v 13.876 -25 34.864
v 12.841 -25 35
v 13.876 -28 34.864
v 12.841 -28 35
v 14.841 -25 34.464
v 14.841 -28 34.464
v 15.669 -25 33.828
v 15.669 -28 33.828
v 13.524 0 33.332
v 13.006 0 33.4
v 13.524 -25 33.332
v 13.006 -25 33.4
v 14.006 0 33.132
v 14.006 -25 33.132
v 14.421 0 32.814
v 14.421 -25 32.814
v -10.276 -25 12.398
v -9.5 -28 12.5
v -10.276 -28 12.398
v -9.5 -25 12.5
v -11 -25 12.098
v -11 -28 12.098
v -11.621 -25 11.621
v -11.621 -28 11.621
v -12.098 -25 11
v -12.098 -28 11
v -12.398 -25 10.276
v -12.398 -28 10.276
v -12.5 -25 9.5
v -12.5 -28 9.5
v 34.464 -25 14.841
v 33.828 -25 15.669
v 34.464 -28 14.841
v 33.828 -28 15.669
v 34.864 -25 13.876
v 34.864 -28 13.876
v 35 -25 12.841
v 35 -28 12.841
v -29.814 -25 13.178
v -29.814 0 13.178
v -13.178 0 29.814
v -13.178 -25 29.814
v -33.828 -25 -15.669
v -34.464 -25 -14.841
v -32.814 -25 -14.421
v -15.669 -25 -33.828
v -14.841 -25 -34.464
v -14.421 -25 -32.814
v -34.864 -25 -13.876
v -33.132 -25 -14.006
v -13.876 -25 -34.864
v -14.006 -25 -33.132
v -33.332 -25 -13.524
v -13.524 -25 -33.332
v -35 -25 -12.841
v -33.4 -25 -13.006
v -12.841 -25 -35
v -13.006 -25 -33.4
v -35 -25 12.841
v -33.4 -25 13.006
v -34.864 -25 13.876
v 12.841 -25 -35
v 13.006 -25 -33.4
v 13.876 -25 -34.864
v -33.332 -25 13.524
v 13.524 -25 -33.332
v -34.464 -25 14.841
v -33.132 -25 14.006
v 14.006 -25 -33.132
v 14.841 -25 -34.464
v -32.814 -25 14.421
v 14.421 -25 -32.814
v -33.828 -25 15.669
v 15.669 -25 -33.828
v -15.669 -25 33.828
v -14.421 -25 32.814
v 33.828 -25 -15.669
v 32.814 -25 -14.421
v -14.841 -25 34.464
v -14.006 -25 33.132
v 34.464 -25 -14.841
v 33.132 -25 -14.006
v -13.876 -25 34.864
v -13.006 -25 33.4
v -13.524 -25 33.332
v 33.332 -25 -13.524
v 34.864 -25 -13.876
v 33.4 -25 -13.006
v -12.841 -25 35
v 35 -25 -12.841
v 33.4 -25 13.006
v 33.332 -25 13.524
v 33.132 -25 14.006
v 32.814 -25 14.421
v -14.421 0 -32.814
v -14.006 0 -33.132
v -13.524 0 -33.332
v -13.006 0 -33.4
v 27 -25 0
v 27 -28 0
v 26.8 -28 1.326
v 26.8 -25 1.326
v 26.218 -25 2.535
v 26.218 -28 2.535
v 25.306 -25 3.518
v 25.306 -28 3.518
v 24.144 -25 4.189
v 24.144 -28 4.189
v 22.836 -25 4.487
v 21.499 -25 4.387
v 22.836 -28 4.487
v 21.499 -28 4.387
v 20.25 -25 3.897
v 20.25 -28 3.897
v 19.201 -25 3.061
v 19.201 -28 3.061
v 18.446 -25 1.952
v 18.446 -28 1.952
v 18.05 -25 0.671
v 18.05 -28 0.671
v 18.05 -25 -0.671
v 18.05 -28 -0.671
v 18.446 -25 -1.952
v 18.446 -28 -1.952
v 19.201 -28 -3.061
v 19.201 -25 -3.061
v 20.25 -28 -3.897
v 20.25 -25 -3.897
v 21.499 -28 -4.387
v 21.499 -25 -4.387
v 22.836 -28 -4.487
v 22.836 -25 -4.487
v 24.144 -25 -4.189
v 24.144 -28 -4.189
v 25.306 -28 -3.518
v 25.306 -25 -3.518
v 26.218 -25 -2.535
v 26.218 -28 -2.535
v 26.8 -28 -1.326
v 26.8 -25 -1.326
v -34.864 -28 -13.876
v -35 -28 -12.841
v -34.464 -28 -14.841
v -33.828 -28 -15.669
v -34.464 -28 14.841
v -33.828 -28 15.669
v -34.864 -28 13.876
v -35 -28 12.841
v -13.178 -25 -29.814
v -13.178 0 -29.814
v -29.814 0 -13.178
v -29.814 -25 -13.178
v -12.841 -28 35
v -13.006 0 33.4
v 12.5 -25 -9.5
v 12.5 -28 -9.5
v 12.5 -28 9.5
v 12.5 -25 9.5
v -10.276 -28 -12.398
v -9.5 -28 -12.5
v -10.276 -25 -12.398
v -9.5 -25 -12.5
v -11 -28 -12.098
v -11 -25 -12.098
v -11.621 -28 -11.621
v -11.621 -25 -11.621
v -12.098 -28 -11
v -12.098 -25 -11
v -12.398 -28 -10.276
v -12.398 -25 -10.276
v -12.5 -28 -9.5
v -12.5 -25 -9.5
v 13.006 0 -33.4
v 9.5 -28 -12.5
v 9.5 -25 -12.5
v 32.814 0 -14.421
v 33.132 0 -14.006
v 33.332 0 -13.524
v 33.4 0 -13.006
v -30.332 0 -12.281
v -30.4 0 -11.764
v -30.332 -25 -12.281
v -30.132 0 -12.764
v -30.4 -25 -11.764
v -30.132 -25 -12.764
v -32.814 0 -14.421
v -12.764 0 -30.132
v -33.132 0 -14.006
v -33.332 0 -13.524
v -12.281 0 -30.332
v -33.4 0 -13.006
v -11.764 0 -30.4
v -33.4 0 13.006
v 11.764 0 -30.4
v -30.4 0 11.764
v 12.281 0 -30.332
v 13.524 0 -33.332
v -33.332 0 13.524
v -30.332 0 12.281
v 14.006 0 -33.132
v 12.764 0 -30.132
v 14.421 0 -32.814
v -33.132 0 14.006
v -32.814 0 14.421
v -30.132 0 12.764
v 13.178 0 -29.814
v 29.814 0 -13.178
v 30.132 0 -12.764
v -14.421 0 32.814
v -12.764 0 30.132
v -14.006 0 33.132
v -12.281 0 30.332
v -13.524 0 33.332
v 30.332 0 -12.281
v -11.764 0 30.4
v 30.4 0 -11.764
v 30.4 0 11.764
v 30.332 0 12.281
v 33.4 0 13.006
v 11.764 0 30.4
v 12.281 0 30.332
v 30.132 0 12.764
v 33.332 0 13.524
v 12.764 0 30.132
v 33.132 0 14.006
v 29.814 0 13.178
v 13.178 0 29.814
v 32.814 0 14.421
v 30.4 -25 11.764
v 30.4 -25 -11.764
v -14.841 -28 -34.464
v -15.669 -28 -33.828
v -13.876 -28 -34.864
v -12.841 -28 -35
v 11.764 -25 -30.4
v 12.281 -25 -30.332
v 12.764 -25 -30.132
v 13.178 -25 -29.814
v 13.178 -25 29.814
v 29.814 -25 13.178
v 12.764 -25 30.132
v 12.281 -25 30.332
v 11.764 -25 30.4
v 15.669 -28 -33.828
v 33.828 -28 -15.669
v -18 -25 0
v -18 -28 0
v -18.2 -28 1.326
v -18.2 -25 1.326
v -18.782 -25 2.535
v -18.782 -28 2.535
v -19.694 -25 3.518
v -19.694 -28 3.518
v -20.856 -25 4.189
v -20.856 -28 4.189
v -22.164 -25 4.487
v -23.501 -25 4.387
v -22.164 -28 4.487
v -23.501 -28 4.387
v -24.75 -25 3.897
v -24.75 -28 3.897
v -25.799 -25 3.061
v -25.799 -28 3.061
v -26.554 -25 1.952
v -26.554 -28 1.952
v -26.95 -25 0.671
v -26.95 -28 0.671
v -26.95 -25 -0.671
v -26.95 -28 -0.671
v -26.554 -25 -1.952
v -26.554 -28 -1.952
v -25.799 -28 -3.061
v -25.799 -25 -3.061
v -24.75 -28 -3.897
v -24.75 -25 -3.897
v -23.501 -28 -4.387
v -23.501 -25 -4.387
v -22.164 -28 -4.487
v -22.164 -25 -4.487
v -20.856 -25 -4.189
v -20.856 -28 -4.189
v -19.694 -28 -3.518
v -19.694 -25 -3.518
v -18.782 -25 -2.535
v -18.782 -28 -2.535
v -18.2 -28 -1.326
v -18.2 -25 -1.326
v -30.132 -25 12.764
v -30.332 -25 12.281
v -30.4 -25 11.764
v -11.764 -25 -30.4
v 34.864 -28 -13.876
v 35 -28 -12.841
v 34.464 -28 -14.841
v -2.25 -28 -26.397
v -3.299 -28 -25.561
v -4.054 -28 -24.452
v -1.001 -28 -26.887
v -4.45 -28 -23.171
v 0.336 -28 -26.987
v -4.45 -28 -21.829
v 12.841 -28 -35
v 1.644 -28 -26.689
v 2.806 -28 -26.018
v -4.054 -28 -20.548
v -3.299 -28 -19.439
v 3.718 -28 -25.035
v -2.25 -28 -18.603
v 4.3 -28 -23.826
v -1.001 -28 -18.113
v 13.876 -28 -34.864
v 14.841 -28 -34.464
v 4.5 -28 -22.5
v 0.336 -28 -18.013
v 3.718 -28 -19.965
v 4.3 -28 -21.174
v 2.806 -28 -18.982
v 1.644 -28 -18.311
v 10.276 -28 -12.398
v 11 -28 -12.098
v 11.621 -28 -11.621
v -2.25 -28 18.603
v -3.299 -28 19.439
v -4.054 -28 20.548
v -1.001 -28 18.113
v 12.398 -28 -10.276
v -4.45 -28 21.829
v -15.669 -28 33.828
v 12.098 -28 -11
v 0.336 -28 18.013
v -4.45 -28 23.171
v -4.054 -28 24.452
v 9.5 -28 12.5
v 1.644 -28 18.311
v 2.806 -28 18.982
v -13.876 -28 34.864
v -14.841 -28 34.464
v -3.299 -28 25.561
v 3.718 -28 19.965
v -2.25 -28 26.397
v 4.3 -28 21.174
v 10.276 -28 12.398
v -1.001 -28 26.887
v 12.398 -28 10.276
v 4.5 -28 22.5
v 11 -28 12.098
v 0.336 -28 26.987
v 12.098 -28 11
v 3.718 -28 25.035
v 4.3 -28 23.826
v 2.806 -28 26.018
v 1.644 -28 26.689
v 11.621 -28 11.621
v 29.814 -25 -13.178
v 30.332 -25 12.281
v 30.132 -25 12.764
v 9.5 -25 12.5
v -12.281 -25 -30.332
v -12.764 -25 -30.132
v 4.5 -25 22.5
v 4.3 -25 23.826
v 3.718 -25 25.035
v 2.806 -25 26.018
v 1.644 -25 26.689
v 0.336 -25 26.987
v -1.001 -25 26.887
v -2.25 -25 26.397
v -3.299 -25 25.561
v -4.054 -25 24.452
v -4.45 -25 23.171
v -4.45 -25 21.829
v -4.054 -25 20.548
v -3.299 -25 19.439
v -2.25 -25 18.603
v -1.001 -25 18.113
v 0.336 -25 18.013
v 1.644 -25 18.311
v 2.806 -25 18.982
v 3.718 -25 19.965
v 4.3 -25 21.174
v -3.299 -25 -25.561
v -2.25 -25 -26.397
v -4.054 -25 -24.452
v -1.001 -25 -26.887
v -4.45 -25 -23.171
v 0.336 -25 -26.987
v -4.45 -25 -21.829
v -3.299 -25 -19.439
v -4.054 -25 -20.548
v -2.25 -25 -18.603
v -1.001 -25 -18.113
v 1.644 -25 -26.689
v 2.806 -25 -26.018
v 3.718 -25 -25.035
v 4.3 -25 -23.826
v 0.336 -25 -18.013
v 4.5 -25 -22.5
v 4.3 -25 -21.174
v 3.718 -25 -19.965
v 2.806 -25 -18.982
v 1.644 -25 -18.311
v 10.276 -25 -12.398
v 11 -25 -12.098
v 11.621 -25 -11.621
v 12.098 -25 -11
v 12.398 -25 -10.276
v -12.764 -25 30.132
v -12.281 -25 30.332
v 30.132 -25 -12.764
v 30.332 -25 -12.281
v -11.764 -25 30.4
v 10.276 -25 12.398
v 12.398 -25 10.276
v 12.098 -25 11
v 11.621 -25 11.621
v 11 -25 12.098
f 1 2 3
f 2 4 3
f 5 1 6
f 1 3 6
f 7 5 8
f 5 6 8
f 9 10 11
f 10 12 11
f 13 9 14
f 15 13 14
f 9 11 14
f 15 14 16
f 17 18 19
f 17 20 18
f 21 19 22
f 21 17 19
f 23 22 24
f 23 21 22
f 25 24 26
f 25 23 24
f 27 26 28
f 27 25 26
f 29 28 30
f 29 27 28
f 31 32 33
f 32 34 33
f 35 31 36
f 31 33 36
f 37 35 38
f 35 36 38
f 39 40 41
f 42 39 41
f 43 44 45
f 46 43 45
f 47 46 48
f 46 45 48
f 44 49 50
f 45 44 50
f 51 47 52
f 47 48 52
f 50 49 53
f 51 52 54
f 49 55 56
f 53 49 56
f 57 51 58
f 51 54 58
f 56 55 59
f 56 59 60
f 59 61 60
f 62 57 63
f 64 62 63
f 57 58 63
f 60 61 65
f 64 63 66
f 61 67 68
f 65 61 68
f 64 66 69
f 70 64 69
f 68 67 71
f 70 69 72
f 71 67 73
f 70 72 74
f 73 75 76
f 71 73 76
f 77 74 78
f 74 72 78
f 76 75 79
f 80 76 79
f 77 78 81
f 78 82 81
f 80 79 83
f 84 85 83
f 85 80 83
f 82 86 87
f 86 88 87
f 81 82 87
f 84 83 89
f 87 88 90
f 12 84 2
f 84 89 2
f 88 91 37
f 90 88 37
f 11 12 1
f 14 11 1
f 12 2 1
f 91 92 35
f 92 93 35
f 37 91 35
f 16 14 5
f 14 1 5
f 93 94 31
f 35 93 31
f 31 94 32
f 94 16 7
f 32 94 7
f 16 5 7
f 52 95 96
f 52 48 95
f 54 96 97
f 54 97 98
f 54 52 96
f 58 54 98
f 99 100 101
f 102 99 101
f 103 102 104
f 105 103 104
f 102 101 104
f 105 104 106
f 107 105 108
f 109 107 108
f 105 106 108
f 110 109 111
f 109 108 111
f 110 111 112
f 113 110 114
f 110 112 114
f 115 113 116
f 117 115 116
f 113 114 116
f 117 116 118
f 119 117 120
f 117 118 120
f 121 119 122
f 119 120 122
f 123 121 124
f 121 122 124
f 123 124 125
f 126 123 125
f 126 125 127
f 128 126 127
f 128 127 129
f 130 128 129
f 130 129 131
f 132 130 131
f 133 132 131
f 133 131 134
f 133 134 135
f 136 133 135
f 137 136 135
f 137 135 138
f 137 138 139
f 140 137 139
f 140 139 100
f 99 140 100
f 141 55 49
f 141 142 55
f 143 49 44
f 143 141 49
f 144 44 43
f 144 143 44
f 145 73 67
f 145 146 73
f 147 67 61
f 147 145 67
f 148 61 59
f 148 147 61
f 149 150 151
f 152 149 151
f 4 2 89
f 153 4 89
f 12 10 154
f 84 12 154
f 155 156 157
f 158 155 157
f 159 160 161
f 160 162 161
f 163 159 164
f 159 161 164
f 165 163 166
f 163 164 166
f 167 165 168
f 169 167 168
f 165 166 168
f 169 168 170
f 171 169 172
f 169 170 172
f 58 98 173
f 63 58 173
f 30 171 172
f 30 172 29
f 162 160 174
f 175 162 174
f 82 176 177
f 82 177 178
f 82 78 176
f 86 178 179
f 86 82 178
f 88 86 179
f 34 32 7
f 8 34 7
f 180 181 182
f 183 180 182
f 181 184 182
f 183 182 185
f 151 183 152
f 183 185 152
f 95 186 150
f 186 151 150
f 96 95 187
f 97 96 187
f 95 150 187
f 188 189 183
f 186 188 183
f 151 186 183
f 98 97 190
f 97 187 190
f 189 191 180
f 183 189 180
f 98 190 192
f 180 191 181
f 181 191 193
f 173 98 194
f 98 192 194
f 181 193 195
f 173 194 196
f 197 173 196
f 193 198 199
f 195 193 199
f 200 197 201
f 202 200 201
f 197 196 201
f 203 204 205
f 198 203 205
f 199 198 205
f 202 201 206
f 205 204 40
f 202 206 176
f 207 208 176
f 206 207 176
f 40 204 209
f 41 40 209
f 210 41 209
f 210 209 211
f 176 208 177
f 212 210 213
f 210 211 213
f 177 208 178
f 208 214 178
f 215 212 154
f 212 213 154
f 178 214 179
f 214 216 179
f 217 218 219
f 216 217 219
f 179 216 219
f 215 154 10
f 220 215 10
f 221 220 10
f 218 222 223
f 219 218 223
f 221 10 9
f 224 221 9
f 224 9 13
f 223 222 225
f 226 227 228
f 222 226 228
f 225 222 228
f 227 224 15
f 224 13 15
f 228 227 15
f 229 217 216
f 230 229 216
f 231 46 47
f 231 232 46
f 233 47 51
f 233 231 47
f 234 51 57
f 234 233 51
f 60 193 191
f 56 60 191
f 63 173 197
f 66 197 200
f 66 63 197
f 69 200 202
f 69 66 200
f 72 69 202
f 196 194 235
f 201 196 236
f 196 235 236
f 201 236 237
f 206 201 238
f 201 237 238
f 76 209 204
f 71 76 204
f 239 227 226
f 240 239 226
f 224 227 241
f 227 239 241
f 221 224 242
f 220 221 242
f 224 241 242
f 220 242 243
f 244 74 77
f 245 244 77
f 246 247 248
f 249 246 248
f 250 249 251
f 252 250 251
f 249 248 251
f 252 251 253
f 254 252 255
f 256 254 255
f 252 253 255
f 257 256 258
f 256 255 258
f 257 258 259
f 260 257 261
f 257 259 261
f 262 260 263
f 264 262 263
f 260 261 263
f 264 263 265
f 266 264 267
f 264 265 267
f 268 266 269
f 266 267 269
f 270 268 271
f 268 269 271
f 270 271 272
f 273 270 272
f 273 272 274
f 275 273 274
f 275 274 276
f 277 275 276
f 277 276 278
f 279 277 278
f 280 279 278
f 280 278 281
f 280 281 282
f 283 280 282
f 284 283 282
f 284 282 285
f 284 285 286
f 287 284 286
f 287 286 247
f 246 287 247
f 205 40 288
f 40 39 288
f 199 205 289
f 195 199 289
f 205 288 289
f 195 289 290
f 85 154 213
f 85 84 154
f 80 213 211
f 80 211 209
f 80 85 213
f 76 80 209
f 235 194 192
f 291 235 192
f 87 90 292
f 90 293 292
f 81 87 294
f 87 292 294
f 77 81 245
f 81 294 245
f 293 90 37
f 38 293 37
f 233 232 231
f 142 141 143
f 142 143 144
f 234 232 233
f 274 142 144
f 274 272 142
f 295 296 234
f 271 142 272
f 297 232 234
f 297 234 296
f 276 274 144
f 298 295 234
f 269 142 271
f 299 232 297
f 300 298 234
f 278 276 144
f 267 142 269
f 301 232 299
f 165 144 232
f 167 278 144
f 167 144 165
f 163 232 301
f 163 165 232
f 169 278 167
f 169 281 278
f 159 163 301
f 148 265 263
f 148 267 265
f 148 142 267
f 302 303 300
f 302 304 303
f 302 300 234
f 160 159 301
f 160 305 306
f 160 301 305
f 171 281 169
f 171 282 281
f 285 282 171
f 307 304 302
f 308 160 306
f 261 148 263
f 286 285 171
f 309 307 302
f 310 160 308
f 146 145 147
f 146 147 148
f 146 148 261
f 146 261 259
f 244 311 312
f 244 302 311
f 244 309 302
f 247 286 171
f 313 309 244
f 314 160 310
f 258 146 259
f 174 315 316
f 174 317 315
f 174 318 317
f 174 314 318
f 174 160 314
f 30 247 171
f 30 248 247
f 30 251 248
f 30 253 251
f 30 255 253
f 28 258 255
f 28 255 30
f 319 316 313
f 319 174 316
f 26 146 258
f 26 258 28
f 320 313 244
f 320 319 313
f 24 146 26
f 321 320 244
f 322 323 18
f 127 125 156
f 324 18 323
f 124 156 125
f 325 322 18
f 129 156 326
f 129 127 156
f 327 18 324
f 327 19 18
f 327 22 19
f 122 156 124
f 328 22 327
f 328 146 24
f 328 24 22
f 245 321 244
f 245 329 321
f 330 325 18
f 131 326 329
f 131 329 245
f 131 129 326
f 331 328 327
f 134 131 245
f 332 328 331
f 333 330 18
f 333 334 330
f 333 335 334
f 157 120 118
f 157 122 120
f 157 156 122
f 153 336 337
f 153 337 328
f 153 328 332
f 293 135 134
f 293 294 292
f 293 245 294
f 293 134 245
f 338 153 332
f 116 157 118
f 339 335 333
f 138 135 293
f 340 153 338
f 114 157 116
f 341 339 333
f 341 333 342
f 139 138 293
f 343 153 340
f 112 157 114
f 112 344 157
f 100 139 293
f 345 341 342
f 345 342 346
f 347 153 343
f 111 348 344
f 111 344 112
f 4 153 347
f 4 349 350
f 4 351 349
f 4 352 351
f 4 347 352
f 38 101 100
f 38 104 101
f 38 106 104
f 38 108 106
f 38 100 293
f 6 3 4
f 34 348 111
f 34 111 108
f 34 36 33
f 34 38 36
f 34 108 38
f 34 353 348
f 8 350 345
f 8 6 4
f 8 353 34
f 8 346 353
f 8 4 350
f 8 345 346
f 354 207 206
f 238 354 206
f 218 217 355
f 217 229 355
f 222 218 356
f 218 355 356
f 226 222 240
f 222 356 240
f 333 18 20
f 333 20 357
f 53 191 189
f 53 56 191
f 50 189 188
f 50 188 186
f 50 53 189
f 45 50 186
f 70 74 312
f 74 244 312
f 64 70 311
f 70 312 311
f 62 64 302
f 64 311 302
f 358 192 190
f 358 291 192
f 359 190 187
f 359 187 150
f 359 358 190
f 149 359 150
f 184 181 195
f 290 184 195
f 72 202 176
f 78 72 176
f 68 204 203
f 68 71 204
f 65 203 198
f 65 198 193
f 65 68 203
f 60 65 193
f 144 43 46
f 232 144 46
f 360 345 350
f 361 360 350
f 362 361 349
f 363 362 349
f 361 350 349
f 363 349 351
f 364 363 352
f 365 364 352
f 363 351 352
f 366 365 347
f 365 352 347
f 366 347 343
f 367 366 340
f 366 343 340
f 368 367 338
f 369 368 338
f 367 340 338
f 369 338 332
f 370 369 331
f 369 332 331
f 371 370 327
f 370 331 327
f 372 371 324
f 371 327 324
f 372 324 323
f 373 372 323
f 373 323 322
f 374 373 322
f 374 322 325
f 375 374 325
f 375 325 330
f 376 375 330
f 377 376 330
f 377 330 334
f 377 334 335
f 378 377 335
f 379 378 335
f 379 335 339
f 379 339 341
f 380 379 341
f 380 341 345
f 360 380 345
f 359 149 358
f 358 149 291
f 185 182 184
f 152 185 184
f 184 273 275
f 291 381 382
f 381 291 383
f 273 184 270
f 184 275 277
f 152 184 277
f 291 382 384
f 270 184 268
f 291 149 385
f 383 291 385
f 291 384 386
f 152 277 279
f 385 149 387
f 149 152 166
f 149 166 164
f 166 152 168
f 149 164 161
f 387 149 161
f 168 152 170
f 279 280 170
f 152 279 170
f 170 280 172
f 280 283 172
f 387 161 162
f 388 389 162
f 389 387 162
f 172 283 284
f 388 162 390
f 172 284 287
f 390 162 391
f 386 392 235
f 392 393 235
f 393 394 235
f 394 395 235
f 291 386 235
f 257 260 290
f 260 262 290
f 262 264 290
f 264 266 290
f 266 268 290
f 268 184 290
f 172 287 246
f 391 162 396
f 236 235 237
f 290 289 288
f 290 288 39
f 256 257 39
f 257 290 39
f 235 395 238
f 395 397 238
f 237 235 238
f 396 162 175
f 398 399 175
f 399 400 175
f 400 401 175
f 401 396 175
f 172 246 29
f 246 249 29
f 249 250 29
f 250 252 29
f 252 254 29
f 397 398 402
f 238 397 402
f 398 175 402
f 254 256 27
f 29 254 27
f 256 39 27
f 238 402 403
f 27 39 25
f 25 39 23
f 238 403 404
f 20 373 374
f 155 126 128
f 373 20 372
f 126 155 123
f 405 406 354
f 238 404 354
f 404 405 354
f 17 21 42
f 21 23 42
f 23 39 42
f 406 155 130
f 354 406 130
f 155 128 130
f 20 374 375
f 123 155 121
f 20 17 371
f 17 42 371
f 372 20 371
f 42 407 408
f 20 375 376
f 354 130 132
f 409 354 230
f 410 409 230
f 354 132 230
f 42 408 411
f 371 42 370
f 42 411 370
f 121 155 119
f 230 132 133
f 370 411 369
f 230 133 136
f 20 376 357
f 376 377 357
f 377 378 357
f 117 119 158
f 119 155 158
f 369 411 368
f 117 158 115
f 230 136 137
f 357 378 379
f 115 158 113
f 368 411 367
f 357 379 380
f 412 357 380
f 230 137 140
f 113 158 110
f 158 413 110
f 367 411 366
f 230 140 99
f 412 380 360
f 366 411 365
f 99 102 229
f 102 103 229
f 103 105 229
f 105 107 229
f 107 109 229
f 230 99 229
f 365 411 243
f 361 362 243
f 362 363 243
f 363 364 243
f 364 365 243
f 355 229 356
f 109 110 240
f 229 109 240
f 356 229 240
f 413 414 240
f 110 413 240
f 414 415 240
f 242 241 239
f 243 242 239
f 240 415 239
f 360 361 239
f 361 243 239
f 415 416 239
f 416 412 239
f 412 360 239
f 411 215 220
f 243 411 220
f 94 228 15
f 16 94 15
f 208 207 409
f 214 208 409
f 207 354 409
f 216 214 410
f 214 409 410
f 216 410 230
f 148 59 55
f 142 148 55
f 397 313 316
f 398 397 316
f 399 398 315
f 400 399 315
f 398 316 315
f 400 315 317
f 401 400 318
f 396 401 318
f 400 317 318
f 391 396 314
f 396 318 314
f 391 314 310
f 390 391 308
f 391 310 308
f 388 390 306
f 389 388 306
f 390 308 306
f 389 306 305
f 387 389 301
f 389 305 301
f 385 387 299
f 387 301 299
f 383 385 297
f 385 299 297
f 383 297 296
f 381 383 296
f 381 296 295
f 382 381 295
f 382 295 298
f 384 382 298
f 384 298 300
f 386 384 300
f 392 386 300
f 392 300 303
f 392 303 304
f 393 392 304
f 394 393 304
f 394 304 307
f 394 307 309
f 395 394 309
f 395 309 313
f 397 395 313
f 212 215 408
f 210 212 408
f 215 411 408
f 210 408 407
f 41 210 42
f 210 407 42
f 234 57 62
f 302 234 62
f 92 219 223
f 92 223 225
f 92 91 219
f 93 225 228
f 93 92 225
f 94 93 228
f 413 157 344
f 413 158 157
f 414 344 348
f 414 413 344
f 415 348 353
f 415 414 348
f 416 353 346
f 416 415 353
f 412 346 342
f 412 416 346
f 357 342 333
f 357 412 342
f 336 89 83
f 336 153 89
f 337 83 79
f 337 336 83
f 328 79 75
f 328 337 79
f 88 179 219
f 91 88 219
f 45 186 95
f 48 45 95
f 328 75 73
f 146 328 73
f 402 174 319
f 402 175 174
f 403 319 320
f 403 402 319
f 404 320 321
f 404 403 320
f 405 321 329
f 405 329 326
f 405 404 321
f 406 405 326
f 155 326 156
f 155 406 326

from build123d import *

# Parameters (mm, degrees)
F1_DEPTH  = 25
F3_DEPTH  = 3
F4_R      = 2
F5_R      = 4
F6_W      = 25
F6_H      = 25
F7_DEPTH  = 25
F8_R      = 3
F9_R      = 4.5
F10_DEPTH = 25


with BuildPart() as f1:
    # F0 (on Front) → F1 (new body)
    with BuildSketch(Plane.XZ):
        Polygon((13.834733, 33.4), (-13.834733, 33.4), (-33.4, 13.834733), (-33.4, -13.834733), (-13.834733, -33.4), (13.834733, -33.4), (33.4, -13.834733), (33.4, 13.834733), align=None)
        Polygon((-12.592092, -30.4), (-30.4, -12.592092), (-30.4, 12.592092), (-12.592092, 30.4), (12.592092, 30.4), (30.4, 12.592092), (30.4, -12.592092), (12.592092, -30.4), align=None, mode=Mode.SUBTRACT)
    extrude(amount=F1_DEPTH)

    # F2 (on face) → F3 (join)
    with BuildSketch(Plane.XZ.offset(25)):
        Polygon((14.497475, 35), (-14.497475, 35), (-35, 14.497475), (-35, -14.497475), (-14.497475, -35), (14.497475, -35), (35, -14.497475), (35, 14.497475), align=None)
    extrude(amount=F3_DEPTH)

    # F4
    f4_edges = [f1.edges().sort_by_distance(p)[0] for p in [
        (13.834733, -12.5, 33.4),
        (33.4, -12.5, 13.834733),
        (33.4, -12.5, -13.834733),
        (13.834733, -12.5, -33.4),
        (-13.834733, -12.5, -33.4),
        (-33.4, -12.5, -13.834733),
        (-33.4, -12.5, 13.834733),
        (-13.834733, -12.5, 33.4),
        (-30.4, -12.5, 12.592092),
        (-30.4, -12.5, -12.592092),
        (-12.592092, -12.5, 30.4),
        (12.592092, -12.5, 30.4),
        (30.4, -12.5, 12.592092),
        (30.4, -12.5, -12.592092),
        (-12.592092, -12.5, -30.4),
        (12.592092, -12.5, -30.4),
    ]]
    fillet(f4_edges, radius=F4_R)

    # F5
    f5_edges = [f1.edges().sort_by_distance(p)[0] for p in [
        (-14.497475, -26.5, 35),
        (-35, -26.5, 14.497475),
        (14.497475, -26.5, 35),
        (35, -26.5, 14.497475),
        (35, -26.5, -14.497475),
        (14.497475, -26.5, -35),
        (-14.497475, -26.5, -35),
        (-35, -26.5, -14.497475),
    ]]
    fillet(f5_edges, radius=F5_R)

    # F6 (on face) → F7 (cut)
    with BuildSketch(Plane.XZ.offset(28)):
        Rectangle(F6_W, F6_H)
    extrude(amount=-F7_DEPTH, mode=Mode.SUBTRACT)

    # F8
    f8_edges = [f1.edges().sort_by_distance(p)[0] for p in [
        (-12.5, -26.5, 12.5),
        (12.5, -26.5, 12.5),
        (12.5, -26.5, -12.5),
        (-12.5, -26.5, -12.5),
    ]]
    fillet(f8_edges, radius=F8_R)

    # F9 (on face) → F10 (cut)
    with BuildSketch(Plane.XZ.offset(28)):
        with Locations((0, 22.5)):
            Circle(F9_R)
        with Locations((22.5, 0)):
            Circle(F9_R)
        with Locations((0, -22.5)):
            Circle(F9_R)
        with Locations((-22.5, 0)):
            Circle(F9_R)
    extrude(amount=-F10_DEPTH, mode=Mode.SUBTRACT)


solid = f1.part
